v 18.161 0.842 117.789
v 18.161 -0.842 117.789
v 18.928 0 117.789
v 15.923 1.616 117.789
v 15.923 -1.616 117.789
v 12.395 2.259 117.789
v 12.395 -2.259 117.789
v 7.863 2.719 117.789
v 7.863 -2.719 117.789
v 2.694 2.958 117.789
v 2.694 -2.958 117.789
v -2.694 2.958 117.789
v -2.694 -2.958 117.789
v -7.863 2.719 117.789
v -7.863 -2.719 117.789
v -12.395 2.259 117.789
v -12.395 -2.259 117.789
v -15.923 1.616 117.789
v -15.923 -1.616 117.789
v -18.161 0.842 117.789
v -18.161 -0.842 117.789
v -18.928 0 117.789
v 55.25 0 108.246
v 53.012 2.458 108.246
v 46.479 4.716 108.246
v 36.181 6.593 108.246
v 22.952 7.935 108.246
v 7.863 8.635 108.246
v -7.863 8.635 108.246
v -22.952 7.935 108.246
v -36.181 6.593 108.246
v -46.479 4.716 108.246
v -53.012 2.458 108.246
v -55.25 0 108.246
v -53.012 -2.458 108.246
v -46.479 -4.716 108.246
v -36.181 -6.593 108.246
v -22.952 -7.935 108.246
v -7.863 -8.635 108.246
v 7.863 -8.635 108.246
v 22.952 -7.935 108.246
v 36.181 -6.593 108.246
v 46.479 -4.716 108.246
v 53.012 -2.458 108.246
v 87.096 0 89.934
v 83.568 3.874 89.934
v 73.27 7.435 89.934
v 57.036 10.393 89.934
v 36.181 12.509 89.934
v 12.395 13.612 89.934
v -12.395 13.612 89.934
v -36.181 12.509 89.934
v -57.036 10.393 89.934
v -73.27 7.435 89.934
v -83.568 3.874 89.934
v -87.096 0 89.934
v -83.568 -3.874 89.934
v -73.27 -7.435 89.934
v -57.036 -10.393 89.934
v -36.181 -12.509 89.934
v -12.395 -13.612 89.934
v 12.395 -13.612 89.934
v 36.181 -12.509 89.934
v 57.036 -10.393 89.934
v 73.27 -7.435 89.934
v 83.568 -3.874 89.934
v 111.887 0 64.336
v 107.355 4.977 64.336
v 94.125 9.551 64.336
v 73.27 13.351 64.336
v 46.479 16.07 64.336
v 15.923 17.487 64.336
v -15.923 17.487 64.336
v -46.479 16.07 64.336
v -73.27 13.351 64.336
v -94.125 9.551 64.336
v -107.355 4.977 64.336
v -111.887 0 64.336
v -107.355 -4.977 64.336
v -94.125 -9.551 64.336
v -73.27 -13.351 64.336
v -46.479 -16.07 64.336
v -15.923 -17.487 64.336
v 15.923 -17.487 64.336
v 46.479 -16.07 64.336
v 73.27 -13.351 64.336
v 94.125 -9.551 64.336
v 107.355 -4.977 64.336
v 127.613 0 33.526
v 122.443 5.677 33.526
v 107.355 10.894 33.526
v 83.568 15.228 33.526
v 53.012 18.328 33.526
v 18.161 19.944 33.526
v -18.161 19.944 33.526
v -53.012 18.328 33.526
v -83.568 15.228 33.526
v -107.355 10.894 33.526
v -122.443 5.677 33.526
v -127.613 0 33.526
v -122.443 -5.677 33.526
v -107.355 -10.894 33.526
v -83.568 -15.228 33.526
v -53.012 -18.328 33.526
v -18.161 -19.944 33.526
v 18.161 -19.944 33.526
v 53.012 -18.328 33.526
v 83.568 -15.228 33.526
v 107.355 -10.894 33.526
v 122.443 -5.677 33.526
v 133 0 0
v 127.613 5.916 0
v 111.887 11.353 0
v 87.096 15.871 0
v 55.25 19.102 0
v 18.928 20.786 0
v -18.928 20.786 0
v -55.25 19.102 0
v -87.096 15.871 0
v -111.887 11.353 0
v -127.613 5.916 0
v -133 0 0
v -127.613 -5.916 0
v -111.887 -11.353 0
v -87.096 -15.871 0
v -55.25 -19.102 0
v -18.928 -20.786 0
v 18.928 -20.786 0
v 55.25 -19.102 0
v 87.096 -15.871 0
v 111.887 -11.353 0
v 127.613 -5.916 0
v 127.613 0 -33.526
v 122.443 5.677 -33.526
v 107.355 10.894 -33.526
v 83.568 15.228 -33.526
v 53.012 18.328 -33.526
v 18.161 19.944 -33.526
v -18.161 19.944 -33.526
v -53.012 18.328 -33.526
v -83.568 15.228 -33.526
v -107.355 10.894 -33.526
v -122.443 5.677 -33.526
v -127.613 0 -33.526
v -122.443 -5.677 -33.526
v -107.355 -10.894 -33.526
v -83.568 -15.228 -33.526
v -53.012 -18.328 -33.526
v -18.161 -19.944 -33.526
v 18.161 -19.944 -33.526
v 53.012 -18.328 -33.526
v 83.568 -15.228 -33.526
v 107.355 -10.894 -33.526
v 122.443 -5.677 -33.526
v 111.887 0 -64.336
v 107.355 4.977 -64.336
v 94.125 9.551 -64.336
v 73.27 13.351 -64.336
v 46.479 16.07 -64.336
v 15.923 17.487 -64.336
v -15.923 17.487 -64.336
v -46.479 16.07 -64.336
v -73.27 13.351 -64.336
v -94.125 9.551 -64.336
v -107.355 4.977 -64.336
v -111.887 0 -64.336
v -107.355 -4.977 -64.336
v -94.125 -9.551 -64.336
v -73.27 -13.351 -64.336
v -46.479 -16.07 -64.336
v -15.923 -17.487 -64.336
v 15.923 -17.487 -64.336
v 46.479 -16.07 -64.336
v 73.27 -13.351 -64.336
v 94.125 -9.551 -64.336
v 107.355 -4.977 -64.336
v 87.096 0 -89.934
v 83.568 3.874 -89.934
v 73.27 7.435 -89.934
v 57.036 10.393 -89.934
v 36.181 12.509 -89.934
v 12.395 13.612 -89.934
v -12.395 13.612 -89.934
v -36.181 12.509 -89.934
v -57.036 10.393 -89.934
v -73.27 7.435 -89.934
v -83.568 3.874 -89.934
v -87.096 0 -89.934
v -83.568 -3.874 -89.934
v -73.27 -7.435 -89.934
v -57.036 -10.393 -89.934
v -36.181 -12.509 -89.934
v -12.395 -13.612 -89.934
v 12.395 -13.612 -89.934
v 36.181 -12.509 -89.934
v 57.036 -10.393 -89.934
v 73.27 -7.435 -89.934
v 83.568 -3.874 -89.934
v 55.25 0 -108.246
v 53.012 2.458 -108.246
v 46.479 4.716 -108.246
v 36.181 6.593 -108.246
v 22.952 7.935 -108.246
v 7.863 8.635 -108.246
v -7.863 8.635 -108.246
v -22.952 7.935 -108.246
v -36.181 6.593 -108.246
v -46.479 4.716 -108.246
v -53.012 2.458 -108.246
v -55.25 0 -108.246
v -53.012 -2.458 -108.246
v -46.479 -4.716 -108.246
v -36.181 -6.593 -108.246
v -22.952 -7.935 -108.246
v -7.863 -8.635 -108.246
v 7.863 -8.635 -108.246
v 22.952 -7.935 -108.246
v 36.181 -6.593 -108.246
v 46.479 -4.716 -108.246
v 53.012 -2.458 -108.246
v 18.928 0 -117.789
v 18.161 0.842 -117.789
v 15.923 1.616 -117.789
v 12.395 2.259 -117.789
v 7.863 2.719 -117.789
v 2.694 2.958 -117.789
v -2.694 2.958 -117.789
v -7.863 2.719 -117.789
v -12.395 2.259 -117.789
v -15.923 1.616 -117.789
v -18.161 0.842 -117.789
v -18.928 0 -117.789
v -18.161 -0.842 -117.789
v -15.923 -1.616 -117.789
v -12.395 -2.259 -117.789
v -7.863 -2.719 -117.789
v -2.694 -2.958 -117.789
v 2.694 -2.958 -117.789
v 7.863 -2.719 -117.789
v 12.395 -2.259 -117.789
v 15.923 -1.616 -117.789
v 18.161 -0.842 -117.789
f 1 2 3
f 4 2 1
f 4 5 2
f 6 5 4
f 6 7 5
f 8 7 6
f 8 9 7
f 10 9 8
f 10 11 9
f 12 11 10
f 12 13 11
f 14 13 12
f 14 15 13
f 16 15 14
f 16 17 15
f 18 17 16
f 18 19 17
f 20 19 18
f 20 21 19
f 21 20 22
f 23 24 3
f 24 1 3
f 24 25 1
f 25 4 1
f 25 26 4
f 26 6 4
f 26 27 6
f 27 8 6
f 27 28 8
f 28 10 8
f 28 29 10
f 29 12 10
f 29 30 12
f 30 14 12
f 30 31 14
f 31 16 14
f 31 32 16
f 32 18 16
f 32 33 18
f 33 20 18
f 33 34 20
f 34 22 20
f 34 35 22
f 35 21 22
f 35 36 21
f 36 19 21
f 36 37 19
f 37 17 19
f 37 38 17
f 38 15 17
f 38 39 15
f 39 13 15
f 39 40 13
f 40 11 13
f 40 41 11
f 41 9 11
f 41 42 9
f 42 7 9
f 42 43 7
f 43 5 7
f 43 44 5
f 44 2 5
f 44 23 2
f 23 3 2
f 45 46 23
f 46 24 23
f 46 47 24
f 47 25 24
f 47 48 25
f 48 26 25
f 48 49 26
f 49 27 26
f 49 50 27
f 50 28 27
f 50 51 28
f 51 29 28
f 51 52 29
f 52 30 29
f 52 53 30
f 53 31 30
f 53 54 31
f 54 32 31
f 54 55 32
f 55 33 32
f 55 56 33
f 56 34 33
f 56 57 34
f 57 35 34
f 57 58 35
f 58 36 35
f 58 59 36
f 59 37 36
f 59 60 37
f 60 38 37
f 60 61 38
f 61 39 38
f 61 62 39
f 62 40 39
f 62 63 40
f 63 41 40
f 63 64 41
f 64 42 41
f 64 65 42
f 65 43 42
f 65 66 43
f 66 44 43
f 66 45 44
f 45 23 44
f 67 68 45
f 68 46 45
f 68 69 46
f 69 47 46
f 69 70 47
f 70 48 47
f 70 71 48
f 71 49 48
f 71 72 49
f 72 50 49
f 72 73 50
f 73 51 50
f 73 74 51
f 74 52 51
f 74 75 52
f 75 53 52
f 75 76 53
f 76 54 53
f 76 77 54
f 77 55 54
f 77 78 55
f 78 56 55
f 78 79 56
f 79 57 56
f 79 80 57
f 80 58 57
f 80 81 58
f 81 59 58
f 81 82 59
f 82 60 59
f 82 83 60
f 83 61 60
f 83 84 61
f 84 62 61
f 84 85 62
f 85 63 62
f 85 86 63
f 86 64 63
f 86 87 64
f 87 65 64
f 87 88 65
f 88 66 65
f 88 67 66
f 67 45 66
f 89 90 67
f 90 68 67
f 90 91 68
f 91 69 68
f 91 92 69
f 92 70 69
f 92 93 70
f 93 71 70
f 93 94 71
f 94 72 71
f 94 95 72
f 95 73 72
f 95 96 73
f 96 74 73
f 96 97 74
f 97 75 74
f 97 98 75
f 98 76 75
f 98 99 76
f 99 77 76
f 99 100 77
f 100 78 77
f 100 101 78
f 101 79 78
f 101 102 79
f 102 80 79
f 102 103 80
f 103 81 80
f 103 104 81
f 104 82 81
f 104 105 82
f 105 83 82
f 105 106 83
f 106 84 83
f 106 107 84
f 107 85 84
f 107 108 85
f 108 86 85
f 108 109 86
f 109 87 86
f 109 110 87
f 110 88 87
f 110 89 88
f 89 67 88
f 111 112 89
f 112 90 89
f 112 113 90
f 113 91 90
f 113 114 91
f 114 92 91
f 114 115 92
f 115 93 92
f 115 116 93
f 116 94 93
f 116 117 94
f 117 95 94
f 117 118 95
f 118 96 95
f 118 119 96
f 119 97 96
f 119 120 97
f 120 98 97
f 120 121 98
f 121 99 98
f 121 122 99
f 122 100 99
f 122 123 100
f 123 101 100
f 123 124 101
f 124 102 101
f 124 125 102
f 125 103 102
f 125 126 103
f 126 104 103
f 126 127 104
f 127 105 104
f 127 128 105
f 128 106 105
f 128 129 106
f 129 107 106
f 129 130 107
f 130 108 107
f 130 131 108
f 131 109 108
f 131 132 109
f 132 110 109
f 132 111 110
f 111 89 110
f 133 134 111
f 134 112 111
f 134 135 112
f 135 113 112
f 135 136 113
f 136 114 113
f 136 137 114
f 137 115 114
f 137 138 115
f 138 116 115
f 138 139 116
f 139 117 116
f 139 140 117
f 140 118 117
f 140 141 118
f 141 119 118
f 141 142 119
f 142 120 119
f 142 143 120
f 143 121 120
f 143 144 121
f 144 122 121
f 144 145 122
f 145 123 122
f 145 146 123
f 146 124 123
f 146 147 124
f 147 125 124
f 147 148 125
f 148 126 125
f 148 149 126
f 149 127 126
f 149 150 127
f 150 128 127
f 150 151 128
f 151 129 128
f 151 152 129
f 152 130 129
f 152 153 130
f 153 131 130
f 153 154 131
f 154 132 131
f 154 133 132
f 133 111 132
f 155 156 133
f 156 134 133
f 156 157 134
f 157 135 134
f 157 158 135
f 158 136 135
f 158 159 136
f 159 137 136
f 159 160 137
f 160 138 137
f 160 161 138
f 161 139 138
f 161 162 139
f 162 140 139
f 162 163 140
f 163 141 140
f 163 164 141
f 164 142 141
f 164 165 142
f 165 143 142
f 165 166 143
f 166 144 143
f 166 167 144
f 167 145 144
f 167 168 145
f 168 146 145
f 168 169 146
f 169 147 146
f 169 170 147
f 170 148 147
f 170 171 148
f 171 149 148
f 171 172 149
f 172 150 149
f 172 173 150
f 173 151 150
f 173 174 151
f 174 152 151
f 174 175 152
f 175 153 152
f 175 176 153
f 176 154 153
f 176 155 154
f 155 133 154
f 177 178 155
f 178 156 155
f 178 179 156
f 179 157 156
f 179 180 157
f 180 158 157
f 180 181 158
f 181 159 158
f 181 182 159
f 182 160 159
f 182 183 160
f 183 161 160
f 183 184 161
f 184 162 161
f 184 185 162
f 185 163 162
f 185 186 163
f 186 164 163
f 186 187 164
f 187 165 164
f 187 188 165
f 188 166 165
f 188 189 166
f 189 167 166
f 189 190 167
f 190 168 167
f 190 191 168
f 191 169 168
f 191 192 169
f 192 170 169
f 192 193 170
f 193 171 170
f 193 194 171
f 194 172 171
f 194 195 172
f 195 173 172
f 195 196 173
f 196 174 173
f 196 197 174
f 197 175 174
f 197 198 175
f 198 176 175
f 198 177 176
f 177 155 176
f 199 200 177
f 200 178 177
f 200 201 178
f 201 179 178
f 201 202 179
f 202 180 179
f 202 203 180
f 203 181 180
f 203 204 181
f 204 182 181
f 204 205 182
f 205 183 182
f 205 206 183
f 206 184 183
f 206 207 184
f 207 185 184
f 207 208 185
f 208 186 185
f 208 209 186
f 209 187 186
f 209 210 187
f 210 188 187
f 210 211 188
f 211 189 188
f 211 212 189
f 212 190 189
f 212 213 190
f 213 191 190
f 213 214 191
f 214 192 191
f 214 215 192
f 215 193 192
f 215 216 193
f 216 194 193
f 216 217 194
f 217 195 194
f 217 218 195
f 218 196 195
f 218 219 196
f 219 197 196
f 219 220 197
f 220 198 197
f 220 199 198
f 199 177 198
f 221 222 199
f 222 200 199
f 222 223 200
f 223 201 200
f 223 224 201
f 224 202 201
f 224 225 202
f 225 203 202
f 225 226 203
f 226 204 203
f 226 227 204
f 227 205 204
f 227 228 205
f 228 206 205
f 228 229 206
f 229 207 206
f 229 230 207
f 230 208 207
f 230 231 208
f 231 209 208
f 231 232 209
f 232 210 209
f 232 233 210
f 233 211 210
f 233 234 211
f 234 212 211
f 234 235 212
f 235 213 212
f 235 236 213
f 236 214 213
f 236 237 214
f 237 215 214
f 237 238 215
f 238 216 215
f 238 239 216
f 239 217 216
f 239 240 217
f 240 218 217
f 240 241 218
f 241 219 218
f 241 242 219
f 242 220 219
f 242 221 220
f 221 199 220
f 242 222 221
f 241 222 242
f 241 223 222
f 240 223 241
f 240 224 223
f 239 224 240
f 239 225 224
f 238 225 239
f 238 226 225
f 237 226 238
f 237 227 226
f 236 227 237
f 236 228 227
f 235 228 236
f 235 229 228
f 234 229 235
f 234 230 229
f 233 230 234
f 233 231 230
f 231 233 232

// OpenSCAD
// Generated by SolidPython 1.0.1 on 2020-07-29 00:46:53


scale(v = [19, 3, 17]) {
	sphere(r = 7);
}
/***********************************************
*********      SolidPython code:      **********
************************************************
 
# import packages: SolidPython
from solid import *
from solid.utils import *
from itertools import chain, combinations, permutations


class Resize:

    def __init__(self, scad_file):
        self.scad_file = scad_file
        #self.scad_file = import_scad(scad_file)
        # cone/cylinder param:
        self.r1 = 0
        self.r2 = 0
        self.h = 0
        # rectangular prism param:
        self.w = 0
        self.l = 0
        # ellipse param:
        self.r = 0

    # import OpenScad code (file name corresponds to shape)


    # classify shape + parameters
    def assign(self, param1, param2, param3):
        if self.scad_file == 'cone.scad':
            self.r1 = param1
            self.r2 = param2
            self.h = param3
        elif self.scad_file == 'cylinder.scad':
            self.r1 = param1
            self.r2 = param2
            self.h = param3
        elif self.scad_file == 'rectangularPrism.scad':
            self.h = param1
            self.l = param2
            self.w = param3
        else:
            self.r = param1
            self.h = param2

    # resize parameters
    def iterate(self):
        x = range(3, 20, 2)
        i = 1
        if self.scad_file == 'cone.scad':
            tempList = list(permutations(x, 2))
            for temp in tempList:
                param1 = temp[0]
                param2 = temp[1]
                filepath = 'produced_scad_files/' + 'cone' + str(param1) + '_' + str(param2) + '_' + '.scad'
                scad_render_to_file(cylinder(h=param1, r1=param2, r2=0), filepath)

        elif self.scad_file == 'cylinder.scad':
            tempList = list(permutations(x, 3))
            for temp in tempList:
                param1 = temp[0]
                param2 = temp[1]
                filepath = 'produced_scad_files/' + 'cylinder' + str(param1) + '_' + str(param2) + '_' + '.scad'
                scad_render_to_file(cylinder(h=param1, r1=param2, r2=param2), filepath)

        elif self.scad_file == 'rectangularPrism.scad':
            tempList = list(permutations(x, 3))
            for temp in tempList:
                param1 = temp[0]
                param2 = temp[1]
                param3 = temp[2]
                filepath = 'produced_scad_files/' + 'rectangularPrism' + str(param1) + '_' + str(param2) + '_' + str(
                    param3) + '.scad'
                scad_render_to_file(cube(size=(param1, param2, param3)), filepath)

        elif self.scad_file == 'ellipse.scad':
            tempList = list(permutations(x, 4))
            for temp in tempList:
                param1 = temp[0]
                param2 = temp[1]
                param3 = temp[2]
                param4 = temp[3]
                filepath = 'produced_scad_files/' + 'ellipse' + str(param1) + '_' + str(param2) + '_' + str(param3) + '_' + str(param4) + '.scad'
                scad_render_to_file(scale([param1, param2, param3])(sphere(r=param4)), filepath)

    def render_to_scadfile(self):
        scad_render_to_file(scad, 'example.scad') 
 
************************************************/
